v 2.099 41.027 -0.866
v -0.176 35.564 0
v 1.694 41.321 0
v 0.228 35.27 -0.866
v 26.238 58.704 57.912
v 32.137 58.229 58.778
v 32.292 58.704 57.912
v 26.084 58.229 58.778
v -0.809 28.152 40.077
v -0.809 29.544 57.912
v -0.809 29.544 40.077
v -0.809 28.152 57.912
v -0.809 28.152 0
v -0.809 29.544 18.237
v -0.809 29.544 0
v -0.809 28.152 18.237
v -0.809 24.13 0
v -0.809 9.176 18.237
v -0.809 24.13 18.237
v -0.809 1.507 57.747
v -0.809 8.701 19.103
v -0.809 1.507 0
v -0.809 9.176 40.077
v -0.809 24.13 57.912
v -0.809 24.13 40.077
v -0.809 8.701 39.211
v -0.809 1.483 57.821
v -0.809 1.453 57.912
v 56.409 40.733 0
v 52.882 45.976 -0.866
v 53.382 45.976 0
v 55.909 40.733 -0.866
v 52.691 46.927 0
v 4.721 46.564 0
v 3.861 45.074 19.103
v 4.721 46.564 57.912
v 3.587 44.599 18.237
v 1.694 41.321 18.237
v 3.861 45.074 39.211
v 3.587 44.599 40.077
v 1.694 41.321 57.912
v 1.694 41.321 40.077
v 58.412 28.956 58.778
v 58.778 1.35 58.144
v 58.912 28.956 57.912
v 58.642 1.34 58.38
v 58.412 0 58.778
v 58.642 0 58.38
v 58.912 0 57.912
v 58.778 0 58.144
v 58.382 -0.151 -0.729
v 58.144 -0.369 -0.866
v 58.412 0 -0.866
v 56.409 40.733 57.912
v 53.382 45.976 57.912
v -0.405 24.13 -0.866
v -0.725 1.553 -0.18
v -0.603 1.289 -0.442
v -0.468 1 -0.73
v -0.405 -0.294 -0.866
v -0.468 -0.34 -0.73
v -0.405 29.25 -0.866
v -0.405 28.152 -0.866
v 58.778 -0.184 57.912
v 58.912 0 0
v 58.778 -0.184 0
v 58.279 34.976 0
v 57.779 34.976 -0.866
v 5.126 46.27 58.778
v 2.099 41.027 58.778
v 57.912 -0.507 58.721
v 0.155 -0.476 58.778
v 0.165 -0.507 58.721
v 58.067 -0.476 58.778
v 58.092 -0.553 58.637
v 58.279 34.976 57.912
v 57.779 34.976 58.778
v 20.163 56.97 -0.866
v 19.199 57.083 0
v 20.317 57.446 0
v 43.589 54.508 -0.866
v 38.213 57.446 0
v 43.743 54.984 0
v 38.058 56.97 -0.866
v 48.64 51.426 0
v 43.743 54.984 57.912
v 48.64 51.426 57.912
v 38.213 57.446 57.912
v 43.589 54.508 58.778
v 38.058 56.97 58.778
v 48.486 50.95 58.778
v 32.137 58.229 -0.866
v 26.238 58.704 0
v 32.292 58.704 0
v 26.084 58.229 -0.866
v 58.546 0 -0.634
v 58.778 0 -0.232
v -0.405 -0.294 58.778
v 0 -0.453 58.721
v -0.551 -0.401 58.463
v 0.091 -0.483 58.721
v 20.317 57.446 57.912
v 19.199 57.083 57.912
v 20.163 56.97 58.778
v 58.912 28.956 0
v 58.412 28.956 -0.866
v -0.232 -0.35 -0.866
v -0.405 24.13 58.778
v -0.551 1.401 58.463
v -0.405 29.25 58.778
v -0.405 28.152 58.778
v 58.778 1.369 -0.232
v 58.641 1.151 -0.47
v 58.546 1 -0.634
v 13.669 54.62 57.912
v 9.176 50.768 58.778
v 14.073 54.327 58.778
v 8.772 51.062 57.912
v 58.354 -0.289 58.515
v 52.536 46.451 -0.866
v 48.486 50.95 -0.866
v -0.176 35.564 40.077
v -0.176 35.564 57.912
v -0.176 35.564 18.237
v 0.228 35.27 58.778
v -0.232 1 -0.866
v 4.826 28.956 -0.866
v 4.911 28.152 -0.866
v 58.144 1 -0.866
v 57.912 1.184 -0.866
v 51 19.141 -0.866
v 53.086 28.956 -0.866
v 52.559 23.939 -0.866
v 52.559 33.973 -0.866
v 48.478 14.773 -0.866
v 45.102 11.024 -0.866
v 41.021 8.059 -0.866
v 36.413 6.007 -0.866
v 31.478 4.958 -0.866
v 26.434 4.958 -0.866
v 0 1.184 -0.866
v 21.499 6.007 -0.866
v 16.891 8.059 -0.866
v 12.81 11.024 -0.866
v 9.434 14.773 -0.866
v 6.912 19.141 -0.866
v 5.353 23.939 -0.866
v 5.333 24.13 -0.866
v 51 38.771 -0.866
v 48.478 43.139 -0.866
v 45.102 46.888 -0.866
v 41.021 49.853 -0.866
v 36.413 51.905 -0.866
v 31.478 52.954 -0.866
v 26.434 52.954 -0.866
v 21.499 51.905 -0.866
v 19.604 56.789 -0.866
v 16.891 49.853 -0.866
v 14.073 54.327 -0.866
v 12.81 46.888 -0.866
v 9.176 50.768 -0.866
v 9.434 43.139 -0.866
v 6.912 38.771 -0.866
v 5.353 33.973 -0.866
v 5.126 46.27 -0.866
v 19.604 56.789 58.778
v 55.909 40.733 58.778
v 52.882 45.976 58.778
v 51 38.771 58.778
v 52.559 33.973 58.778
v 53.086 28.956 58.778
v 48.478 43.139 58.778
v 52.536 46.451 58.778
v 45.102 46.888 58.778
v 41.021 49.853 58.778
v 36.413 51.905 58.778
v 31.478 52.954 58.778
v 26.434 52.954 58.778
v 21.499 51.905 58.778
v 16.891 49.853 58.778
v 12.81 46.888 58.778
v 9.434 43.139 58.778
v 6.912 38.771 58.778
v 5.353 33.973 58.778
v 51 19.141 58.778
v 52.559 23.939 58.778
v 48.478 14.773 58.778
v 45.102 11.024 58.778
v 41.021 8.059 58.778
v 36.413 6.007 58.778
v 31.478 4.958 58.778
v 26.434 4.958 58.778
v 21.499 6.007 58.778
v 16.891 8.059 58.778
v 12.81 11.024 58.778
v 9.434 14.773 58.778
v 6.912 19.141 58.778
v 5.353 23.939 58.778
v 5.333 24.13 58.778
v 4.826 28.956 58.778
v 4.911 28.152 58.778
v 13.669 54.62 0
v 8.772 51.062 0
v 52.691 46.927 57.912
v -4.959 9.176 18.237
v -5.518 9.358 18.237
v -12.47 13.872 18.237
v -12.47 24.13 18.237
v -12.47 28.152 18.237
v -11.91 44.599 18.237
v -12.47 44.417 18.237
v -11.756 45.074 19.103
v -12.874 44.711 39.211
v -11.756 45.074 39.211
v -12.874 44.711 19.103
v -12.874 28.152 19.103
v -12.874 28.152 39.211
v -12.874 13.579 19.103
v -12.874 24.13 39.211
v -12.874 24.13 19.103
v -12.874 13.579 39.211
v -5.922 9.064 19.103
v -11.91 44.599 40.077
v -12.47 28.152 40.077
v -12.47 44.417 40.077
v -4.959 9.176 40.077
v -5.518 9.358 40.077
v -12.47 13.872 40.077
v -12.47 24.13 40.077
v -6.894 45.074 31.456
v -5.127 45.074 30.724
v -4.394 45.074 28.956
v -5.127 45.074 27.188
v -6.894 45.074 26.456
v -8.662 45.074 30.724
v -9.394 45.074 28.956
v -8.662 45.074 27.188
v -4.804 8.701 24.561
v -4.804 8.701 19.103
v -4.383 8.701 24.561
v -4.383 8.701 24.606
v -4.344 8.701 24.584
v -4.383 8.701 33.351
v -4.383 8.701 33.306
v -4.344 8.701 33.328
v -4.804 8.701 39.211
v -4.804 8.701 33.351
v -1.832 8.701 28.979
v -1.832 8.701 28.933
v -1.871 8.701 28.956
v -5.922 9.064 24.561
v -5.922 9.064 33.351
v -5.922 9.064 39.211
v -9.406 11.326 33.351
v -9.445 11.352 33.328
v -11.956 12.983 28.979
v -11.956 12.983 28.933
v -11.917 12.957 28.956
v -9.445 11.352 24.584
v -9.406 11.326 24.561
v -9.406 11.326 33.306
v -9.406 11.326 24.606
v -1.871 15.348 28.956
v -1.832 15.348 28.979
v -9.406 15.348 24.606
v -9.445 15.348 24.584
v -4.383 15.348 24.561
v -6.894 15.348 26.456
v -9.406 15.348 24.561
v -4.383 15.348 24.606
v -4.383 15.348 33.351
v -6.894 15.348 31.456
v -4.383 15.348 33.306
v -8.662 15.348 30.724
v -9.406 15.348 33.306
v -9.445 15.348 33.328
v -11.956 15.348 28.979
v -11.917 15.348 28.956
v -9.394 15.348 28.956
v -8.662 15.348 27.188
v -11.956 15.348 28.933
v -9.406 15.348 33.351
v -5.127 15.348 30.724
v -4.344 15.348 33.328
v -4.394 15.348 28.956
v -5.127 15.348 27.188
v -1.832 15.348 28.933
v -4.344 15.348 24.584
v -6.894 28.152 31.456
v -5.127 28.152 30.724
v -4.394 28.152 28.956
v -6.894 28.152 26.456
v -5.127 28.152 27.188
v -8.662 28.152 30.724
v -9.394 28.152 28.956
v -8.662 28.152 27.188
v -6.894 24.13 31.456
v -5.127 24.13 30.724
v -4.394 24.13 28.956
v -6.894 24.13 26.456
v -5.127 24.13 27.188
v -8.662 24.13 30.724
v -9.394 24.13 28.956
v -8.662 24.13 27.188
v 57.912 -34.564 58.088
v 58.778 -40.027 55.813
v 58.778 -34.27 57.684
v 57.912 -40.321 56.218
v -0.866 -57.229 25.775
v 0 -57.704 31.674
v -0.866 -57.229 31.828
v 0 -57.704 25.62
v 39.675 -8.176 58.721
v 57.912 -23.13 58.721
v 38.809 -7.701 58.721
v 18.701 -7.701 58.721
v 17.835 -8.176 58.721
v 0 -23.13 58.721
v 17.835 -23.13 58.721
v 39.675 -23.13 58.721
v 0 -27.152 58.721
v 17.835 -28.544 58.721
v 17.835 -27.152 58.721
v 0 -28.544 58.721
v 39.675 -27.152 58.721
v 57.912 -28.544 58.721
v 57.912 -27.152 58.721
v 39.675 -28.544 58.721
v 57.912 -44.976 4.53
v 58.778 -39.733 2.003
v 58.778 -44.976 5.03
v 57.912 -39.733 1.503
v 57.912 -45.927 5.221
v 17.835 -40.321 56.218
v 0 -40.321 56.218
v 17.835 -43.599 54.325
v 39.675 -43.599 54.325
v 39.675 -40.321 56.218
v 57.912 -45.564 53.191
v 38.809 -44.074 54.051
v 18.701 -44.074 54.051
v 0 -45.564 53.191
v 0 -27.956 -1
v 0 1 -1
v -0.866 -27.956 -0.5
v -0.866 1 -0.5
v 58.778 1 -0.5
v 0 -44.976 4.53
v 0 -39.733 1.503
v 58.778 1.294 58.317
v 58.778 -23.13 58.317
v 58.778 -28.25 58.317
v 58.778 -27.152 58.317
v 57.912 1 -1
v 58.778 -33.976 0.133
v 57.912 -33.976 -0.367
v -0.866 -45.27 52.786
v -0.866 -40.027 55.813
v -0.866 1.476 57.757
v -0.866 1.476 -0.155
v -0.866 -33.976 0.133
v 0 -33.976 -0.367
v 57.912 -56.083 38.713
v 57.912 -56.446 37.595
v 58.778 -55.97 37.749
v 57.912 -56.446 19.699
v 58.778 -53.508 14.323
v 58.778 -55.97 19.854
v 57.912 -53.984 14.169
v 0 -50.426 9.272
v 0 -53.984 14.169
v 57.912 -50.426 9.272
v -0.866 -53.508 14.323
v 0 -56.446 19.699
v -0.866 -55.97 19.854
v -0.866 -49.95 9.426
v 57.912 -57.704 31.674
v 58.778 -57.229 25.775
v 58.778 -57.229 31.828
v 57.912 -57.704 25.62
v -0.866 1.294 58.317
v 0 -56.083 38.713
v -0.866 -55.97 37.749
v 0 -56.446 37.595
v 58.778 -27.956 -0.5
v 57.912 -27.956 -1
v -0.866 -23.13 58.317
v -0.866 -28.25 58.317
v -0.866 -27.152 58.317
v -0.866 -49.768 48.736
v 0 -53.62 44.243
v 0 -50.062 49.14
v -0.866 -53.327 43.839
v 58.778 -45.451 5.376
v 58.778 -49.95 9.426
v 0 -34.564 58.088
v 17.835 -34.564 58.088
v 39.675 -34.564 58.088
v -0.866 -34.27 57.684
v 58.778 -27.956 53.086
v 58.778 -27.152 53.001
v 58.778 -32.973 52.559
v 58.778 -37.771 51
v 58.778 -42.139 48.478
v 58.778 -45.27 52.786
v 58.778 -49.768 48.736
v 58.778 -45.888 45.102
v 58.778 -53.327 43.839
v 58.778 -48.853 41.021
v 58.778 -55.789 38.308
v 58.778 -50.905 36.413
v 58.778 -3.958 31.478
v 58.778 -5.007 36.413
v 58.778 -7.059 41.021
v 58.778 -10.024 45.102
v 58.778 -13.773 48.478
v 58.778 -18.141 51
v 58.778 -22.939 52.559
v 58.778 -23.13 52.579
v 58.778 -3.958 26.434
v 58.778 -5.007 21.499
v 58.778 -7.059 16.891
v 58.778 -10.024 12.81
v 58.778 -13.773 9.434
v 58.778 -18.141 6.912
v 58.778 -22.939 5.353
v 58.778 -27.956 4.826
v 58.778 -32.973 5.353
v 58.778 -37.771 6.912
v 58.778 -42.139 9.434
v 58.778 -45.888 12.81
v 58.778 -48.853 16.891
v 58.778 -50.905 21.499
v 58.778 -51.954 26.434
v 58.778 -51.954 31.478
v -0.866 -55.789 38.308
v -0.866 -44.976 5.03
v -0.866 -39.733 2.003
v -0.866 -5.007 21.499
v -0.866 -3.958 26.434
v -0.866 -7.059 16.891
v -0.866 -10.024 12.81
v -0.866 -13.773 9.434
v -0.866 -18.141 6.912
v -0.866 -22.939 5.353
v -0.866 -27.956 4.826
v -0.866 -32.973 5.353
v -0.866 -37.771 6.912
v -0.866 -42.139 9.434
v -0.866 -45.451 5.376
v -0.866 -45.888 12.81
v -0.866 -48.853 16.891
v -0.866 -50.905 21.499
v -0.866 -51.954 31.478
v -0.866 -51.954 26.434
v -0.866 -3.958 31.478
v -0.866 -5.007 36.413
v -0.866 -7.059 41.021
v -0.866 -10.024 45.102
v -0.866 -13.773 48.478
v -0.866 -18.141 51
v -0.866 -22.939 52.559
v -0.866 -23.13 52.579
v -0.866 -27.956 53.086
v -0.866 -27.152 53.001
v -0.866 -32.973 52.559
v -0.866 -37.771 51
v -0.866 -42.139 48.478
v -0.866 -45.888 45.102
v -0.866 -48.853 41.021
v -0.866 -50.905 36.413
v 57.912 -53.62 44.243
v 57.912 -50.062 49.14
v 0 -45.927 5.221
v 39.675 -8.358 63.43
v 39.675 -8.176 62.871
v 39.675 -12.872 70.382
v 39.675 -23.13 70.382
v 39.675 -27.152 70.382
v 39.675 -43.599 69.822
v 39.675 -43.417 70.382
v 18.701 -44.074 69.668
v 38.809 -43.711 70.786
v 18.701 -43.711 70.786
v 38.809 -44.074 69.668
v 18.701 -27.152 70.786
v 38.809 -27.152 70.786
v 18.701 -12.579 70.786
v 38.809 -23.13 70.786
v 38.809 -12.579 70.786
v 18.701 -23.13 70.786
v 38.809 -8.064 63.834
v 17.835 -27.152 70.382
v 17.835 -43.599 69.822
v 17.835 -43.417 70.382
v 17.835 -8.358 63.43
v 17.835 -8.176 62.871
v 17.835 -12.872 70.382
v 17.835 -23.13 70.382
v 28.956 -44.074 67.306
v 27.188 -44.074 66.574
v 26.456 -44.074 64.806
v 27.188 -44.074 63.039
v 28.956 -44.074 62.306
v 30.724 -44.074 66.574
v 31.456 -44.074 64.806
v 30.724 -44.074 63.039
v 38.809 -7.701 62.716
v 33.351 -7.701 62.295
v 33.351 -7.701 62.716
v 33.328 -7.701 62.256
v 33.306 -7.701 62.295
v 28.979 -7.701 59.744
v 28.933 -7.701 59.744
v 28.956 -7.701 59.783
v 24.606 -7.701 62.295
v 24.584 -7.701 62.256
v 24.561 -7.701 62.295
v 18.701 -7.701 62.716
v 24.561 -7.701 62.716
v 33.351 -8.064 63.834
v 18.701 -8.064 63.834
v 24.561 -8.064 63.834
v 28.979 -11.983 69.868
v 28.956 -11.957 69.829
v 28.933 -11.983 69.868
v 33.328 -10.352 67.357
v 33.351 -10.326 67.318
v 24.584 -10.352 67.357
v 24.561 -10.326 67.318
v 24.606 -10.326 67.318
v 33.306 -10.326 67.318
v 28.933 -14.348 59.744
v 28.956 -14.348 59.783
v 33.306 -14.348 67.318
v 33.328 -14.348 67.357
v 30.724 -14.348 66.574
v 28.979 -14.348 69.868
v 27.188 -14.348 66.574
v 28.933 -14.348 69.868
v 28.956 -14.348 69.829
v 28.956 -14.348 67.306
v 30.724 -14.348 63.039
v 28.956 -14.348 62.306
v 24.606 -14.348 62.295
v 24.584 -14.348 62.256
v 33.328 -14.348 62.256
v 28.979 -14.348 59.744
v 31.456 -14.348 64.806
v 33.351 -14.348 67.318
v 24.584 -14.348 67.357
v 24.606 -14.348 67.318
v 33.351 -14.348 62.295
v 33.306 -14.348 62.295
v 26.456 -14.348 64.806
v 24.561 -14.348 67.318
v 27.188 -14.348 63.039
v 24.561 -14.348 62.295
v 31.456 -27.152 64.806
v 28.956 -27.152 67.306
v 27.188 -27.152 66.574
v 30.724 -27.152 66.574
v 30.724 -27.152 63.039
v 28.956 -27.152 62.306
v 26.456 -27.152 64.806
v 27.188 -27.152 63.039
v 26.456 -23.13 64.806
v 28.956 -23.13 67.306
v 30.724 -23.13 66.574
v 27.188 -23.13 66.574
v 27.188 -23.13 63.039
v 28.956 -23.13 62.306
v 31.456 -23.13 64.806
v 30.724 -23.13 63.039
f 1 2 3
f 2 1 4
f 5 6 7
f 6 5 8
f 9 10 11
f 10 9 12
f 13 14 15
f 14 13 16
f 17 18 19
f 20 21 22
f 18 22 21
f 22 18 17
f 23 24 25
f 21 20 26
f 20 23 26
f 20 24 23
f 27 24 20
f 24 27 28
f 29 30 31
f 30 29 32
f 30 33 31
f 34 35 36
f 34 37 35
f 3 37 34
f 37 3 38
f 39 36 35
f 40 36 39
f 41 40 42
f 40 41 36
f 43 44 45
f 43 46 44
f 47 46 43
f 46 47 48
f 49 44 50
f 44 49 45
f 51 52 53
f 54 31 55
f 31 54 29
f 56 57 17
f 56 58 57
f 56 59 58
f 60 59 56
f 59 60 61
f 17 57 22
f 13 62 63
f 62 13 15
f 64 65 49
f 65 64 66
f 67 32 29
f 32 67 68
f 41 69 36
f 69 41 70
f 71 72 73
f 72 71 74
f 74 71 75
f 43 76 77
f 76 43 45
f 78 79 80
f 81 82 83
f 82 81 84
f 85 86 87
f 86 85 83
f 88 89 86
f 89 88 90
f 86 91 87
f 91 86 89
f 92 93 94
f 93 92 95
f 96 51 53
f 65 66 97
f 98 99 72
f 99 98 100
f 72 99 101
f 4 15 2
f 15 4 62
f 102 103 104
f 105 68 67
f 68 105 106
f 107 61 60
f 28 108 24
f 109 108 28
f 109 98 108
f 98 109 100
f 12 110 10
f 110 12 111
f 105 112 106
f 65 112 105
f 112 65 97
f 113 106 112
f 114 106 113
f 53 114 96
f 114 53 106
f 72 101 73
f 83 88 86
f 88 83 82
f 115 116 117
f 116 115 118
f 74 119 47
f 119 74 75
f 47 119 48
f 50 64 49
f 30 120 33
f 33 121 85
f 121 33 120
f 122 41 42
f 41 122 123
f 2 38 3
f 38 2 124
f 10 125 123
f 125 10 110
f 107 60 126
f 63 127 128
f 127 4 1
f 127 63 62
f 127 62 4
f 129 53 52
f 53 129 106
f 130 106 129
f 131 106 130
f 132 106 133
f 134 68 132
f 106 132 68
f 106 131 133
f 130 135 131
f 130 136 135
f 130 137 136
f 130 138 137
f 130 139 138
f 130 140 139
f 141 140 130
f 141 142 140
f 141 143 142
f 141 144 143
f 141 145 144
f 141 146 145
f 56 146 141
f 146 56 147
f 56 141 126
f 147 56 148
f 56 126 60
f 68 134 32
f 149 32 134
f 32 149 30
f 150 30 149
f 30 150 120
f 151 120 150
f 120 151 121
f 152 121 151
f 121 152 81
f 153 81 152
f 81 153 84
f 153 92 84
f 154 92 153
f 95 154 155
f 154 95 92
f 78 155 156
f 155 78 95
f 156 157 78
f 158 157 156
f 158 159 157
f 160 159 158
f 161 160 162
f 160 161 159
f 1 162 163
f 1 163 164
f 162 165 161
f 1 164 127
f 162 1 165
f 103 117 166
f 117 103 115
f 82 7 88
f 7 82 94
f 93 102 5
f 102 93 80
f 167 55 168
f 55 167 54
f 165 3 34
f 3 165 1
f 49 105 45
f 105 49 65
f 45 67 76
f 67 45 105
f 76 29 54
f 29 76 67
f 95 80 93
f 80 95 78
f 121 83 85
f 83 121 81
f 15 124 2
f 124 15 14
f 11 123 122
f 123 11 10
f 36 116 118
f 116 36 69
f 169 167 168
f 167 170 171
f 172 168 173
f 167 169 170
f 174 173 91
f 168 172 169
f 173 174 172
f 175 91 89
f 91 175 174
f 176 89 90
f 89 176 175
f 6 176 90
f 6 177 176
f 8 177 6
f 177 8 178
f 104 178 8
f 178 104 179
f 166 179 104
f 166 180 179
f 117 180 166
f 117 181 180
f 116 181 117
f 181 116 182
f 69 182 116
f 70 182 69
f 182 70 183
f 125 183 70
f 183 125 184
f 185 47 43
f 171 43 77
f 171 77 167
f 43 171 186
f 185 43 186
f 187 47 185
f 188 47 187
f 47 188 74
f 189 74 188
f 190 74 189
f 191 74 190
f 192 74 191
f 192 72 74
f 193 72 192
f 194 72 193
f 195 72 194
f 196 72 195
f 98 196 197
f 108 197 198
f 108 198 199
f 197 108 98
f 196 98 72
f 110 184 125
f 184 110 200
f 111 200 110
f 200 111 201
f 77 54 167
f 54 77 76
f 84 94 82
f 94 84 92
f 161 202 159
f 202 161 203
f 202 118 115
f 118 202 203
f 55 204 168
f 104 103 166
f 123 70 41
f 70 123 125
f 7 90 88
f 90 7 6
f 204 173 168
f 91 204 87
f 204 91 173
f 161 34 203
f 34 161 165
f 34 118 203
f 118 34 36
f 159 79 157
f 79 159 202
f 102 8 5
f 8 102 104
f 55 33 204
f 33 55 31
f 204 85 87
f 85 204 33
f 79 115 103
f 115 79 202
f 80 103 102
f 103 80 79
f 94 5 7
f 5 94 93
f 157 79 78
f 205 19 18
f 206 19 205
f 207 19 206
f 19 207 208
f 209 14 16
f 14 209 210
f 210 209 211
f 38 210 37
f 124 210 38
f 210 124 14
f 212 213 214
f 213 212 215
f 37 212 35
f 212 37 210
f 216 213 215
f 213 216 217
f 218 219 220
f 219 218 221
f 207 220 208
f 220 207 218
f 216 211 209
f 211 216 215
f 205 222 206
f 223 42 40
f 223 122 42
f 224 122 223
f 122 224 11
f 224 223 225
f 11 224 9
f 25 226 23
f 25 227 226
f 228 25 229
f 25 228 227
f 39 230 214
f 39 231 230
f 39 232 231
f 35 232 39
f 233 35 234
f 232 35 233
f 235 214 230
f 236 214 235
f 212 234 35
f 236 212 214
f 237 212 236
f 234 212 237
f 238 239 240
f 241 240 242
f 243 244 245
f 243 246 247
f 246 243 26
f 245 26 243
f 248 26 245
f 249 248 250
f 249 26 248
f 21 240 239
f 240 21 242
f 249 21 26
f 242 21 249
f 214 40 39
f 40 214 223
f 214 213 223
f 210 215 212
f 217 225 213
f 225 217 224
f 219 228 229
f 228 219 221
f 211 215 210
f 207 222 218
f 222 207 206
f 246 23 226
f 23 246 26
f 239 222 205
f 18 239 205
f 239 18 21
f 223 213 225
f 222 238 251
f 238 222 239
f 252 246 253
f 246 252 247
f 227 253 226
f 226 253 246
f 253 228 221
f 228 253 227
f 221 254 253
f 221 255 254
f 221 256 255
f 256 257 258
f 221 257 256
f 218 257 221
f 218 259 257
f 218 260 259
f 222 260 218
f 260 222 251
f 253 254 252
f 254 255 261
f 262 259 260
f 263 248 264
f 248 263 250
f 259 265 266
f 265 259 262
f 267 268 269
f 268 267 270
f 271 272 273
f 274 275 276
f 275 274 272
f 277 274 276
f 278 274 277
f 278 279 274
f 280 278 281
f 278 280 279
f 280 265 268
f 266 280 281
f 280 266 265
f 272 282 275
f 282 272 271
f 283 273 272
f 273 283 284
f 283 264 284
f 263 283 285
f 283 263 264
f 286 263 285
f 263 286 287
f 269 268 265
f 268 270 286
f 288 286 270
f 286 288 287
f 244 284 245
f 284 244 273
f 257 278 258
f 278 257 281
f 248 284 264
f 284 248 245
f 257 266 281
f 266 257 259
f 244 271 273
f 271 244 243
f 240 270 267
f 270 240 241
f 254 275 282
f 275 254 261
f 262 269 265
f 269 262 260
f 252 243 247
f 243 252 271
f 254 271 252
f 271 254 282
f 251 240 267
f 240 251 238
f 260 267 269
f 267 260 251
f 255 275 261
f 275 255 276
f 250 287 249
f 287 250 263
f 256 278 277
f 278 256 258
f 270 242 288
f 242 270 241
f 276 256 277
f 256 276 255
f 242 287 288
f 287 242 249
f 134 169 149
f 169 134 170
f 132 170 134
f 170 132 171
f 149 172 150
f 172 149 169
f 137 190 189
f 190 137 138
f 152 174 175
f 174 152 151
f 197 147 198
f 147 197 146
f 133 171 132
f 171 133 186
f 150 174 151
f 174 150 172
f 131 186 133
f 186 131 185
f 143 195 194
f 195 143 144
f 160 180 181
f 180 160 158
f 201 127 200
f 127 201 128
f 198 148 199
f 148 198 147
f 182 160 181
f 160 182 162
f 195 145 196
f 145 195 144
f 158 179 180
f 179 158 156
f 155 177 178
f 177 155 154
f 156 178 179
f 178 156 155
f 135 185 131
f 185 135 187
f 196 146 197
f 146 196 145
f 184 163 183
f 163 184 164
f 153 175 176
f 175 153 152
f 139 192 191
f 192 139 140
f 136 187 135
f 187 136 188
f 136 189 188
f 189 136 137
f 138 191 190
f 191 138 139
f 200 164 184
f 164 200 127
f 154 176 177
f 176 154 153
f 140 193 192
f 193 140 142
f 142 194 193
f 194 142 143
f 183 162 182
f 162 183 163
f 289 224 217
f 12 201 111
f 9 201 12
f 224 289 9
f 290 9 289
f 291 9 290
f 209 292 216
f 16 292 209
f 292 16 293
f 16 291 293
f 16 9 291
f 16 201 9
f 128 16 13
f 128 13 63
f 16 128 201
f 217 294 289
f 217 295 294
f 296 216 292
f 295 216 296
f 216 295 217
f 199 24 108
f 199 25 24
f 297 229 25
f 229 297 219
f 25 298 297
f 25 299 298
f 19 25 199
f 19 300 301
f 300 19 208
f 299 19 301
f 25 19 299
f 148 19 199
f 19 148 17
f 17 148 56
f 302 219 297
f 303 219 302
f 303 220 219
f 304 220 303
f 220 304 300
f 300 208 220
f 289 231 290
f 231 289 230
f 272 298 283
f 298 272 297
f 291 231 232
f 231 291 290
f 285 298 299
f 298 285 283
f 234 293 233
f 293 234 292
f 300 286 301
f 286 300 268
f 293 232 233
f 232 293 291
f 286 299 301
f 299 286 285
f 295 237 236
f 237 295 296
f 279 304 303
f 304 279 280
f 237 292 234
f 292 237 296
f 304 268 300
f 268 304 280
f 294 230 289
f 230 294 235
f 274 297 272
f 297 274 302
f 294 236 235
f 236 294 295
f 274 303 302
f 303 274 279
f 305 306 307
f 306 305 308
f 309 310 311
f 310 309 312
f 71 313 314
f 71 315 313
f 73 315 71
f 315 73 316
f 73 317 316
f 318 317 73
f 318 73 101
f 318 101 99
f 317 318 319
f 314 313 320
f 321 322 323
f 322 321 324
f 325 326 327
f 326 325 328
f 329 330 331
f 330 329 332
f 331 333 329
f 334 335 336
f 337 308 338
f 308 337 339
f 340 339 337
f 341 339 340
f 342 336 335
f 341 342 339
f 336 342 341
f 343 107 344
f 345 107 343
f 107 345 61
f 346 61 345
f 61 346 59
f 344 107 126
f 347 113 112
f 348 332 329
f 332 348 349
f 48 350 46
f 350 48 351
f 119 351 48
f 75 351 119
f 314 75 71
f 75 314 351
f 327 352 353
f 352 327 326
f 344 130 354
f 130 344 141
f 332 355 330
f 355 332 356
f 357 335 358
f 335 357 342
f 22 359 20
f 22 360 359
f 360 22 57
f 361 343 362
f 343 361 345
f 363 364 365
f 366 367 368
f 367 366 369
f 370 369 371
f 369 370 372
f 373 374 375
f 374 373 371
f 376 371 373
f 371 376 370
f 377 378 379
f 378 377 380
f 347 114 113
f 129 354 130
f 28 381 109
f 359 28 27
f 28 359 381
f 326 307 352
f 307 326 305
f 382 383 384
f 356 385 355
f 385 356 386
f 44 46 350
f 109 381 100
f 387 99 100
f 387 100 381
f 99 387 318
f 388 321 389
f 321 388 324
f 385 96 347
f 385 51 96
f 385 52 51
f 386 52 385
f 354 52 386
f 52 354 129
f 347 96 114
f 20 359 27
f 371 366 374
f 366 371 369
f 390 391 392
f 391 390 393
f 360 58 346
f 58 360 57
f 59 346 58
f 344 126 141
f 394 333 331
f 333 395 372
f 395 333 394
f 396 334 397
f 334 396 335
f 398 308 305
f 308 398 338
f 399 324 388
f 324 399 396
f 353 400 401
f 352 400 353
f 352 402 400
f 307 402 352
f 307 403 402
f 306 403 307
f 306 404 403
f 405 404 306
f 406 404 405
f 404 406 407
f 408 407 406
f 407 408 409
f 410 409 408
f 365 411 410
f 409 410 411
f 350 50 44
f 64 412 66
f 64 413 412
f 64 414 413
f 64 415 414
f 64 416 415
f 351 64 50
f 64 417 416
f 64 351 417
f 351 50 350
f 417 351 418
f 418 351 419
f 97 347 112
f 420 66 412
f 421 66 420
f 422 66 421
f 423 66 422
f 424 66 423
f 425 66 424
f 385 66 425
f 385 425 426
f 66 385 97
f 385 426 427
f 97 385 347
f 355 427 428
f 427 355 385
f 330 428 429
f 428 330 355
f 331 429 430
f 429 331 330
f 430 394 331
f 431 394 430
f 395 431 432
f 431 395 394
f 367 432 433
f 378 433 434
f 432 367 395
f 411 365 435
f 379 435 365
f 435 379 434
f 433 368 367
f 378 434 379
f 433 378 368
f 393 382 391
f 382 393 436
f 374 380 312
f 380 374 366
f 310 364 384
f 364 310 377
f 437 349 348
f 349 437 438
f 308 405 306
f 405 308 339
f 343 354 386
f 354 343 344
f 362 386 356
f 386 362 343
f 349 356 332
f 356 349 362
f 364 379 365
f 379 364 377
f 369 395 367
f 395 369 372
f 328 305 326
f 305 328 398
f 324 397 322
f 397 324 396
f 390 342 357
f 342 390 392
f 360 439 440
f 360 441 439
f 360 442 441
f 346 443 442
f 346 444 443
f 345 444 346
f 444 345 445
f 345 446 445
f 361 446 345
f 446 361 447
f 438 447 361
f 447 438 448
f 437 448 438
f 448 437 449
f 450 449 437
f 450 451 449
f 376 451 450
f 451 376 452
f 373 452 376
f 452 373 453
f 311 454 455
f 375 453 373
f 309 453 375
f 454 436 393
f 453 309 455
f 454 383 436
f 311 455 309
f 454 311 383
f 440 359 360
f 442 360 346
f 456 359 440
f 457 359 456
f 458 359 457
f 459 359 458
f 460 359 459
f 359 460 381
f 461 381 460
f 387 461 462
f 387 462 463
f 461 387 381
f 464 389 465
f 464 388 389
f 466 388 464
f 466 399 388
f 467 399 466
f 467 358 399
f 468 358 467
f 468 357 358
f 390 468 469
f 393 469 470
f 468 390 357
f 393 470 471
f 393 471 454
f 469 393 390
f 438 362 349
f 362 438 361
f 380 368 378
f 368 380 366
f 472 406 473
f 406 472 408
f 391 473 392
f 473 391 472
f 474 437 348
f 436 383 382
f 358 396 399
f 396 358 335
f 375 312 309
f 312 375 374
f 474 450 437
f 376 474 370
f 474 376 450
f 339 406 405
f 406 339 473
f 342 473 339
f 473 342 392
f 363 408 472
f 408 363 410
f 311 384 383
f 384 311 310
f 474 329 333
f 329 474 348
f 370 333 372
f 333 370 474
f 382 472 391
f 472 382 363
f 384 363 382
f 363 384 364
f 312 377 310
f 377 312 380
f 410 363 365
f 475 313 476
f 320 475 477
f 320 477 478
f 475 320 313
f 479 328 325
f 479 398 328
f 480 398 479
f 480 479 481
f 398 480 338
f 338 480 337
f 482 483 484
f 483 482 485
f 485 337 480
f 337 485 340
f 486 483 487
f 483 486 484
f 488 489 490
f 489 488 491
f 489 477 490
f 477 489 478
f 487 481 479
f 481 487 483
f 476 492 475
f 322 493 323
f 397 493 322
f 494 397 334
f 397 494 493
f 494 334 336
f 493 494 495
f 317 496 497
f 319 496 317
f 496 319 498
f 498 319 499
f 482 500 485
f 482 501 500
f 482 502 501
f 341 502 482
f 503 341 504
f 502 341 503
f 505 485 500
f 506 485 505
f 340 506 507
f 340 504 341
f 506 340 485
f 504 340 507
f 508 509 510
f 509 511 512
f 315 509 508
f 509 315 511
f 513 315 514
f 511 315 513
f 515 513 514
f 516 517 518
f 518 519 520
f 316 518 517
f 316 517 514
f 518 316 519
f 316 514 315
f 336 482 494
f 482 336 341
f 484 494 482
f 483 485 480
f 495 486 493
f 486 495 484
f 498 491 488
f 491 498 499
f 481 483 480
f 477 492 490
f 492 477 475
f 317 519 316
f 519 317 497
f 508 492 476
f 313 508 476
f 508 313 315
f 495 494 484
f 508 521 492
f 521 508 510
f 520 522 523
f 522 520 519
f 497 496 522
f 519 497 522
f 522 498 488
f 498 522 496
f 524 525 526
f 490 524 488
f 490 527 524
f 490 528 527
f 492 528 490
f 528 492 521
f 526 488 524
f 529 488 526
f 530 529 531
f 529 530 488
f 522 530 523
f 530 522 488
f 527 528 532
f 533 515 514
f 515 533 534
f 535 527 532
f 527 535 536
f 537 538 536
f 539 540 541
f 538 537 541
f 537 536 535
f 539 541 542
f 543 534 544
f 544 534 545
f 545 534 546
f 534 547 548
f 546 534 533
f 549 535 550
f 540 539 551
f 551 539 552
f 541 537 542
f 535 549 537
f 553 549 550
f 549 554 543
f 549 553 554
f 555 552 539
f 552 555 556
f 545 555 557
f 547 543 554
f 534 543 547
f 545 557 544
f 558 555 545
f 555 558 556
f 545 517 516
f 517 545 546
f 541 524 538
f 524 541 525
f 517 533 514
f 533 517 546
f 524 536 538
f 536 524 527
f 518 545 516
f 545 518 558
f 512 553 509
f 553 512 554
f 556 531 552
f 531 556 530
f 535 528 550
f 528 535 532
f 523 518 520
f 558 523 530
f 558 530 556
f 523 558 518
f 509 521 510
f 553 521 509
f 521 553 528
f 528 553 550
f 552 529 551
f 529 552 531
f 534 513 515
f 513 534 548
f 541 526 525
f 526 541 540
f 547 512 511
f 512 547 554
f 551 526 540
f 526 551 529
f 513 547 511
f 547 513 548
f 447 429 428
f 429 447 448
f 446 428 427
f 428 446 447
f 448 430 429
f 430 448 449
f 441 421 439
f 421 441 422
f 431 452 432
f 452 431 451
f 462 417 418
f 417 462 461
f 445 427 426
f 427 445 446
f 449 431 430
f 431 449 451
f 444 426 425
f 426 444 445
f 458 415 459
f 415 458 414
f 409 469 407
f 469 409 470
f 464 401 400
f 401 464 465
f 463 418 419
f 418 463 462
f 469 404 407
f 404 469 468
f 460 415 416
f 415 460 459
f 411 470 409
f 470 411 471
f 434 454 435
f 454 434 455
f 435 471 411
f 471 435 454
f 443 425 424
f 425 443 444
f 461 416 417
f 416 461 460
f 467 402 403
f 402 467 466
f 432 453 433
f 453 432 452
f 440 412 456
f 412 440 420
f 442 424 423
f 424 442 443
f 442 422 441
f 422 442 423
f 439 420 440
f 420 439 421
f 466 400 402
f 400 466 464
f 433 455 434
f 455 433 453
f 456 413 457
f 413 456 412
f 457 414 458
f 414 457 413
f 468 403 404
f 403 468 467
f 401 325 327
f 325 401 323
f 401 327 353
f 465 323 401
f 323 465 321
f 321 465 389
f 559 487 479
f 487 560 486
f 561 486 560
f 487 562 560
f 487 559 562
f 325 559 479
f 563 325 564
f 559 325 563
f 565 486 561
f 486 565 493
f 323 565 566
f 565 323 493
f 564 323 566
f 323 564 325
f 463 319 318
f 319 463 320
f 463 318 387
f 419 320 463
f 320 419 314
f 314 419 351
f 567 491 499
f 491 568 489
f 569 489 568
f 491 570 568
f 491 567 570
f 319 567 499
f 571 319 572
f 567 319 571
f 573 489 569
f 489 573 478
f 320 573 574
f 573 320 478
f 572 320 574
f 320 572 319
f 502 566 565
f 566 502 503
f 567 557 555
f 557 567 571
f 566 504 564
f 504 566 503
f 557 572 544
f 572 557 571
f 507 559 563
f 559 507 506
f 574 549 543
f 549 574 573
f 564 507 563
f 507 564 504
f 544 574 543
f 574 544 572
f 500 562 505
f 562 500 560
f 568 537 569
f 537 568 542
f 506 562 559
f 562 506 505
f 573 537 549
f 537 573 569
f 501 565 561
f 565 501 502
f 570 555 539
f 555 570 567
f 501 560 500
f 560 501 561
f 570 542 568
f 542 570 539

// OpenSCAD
//M. Haris Usmani
//http://harisusmani.com

//All Units are in mm, Import as STL with Unit=mm

/* [Main Settings] */
//Radius of Pipe in Inches (Schedule 40)
R=1.9; //[2.375:2"PVC,1.9:1-1/2"PVC,1.660:1-1/4"PVC,1.315:1"PVC]

//Space for Tightening
T=3; //[0:5]

//Nut Size
M=5; //[4,5,6]

/////////////////////////////////////////////////////////////////////////////
R_mm=R*25.4; //Converted to mm!
//Strength of Clamp (Fixed)
S=1.2; // [1.2] Determines Strength of Clamp in Percentage-FIXED!

/////////////////////////////////////////////////////////////////////////////
//Hexagonal Module from shapes.scad, http://svn.clifford.at/openscad/trunk/libraries/shapes.scad by Catarina Mota
module hexagon(size, height) {
  boxWidth = size/1.75;
  for (r = [-60, 0, 60]) rotate([0,0,r]) cube([boxWidth, size, height], true);
}
/////////////////////////////////////////////////////////////////////////////

//Pipe Model for Visualization
//translate([R_mm*S/2,R_mm*S/2,-R_mm*6]) cylinder(R_mm*10,R_mm/2,R_mm/2);

union()//Main Duplication
{

difference() //Pipe Hole
{
union()
{
minkowski() //Fillet
{
	union()
	{
		cube([R_mm*S,R_mm/2*S, R_mm*S]); //Main Body
		translate([R_mm*S/2,R_mm*S/2,0]) cylinder(R_mm*S,R_mm*S/2,R_mm*S/2); //Curved Edge
	}
	sphere([R_mm/2,R_mm,R_mm*5/12]); //Fillet Object
}

minkowski() //Fillet
{
	difference() //Hard Chamfer
	{
		translate([-R_mm/4,R_mm/5,(R_mm/2)-(R_mm*5/48)]) cube([R_mm/2,R_mm/1.4,R_mm*5/12]);
		translate([-R_mm,-R_mm*7/17,(R_mm/2)-(R_mm*5/24)]) rotate([0,0,-33]) cube([R_mm/2,R_mm,2*R_mm*5/12]);
	}
	sphere([R_mm/2,R_mm,R_mm*5/12]); //Fillet Object
}
}
	union()
	{
		translate([R_mm*S/2,R_mm*S/2,-R_mm*6]) cylinder(R_mm*10,R_mm/2,R_mm/2);//Pipe
		translate([-R_mm,R_mm*S*5/12,-R_mm]) cube([R_mm*2,R_mm/(15-T),R_mm*4]);//Tightning Space
		translate([-R_mm/7,R_mm*2,(R_mm*S/2)]) rotate([90,0,0]) cylinder((R_mm*4),M/2,M/2); //Screw Space
		if (M==4) translate([-R_mm/7,-R_mm*0.2,(R_mm*S/2)]) rotate([90,0,0]) hexagon(7.66,50); //NUTS
		if (M==5) translate([-R_mm/7,-R_mm*0.2,(R_mm*S/2)]) rotate([90,0,0]) hexagon(8.79,50);
		if (M==6) translate([-R_mm/7,-R_mm*0.2,(R_mm*S/2)]) rotate([90,0,0]) hexagon(11.05,50);
	}
} //Single Side ENDS

}

{

translate([R_mm*S,1,R_mm*S]) rotate([180,90,0]) //Main Translation

//COPY SIDE HERE
difference() //Pipe Hole
{
union()
{
minkowski() //Fillet
{
	union()
	{
		cube([R_mm*S,R_mm/2*S, R_mm*S]); //Main Body
		translate([R_mm*S/2,R_mm*S/2,0]) cylinder(R_mm*S,R_mm*S/2,R_mm*S/2); //Curved Edge
	}
	sphere([R_mm/2,R_mm,R_mm*5/12]); //Fillet Object
}

minkowski() //Fillet
{
	difference() //Hard Chamfer
	{
		translate([-R_mm/4,R_mm/5,(R_mm/2)-(R_mm*5/48)]) cube([R_mm/2,R_mm/1.4,R_mm*5/12]);
		translate([-R_mm,-R_mm*7/17,(R_mm/2)-(R_mm*5/24)]) rotate([0,0,-33]) cube([R_mm/2,R_mm,2*R_mm*5/12]);
	}
	sphere([R_mm/2,R_mm,R_mm*5/12]); //Fillet Object
}
}
	union()
	{
		translate([R_mm*S/2,R_mm*S/2,-R_mm*6]) cylinder(R_mm*10,R_mm/2,R_mm/2);//Pipe
		translate([-R_mm,R_mm*S*5/12,-R_mm]) cube([R_mm*2,R_mm/(15-T),R_mm*4]);//Tightning Space
		translate([-R_mm/7,R_mm*2,(R_mm*S/2)]) rotate([90,0,0]) cylinder((R_mm*4),M/2,M/2); //Screw Space
		if (M==4) translate([-R_mm/7,-R_mm*0.2,(R_mm*S/2)]) rotate([90,0,0]) hexagon(7.66,50); //NUTS
		if (M==5) translate([-R_mm/7,-R_mm*0.2,(R_mm*S/2)]) rotate([90,0,0]) hexagon(8.79,50);
		if (M==6) translate([-R_mm/7,-R_mm*0.2,(R_mm*S/2)]) rotate([90,0,0]) hexagon(11.05,50);
	}
}
///////////////
}

//preview[view: north, tilt: top];
